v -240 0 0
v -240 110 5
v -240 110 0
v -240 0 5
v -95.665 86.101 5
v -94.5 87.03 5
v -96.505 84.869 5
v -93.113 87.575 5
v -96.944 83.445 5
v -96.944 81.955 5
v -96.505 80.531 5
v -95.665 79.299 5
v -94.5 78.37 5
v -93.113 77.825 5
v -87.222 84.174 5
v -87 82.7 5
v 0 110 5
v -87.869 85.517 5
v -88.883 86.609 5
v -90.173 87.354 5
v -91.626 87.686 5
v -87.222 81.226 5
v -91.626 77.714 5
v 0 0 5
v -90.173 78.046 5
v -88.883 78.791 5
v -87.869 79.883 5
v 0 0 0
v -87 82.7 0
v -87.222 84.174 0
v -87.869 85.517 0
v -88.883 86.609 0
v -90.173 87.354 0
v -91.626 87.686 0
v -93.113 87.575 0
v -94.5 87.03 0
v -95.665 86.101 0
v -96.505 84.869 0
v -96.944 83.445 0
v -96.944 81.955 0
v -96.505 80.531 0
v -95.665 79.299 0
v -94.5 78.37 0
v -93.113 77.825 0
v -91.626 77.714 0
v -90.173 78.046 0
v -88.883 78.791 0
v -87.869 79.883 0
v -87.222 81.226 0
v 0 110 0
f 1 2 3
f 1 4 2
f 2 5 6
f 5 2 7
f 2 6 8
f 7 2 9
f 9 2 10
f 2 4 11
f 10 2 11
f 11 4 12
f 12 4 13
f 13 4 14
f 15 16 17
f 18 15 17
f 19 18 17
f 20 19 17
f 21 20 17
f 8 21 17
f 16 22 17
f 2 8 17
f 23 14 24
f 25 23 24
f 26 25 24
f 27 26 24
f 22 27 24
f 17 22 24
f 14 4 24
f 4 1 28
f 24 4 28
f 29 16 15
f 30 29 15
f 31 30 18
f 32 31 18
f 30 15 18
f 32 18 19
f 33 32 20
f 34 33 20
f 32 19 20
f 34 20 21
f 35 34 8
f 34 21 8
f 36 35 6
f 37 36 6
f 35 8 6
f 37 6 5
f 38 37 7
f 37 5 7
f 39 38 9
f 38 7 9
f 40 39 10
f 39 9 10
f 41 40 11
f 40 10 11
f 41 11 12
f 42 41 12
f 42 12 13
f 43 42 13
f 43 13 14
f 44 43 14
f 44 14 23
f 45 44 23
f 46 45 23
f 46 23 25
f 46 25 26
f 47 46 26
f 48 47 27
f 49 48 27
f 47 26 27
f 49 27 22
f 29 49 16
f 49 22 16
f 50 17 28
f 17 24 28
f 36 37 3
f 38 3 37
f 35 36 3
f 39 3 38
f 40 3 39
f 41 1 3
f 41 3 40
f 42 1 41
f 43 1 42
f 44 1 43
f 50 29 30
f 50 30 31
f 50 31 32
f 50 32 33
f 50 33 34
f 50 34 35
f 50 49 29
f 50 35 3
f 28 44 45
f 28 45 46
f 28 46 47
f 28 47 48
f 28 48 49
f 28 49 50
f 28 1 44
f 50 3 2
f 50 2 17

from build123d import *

# Parameters (mm, degrees)
ESQUISSE1_W             = 240
ESQUISSE1_H             = 50
BOSS_EXTRU_1_DEPTH      = 5
ESQUISSE2_W             = 240
ESQUISSE2_H             = 5
BOSS_EXTRU_2_DEPTH      = 50
ESQUISSE4_R             = 5
ENL_V_MAT_EXTRU_1_DEPTH = 5
ESQUISSE5_W             = 240
ESQUISSE5_H             = 5
BOSS_EXTRU_3_DEPTH      = 10


with BuildPart() as part:
    # Esquisse1 → Boss.-Extru.1 (new body)
    with BuildSketch(Plane.XY):
        with Locations((-120, 25)):
            Rectangle(ESQUISSE1_W, ESQUISSE1_H)
    extrude(amount=BOSS_EXTRU_1_DEPTH)

    # Esquisse2 → Boss.-Extru.2 (add)
    with BuildSketch(Plane(origin=(0, 50, 0), x_dir=(1, 0, 0), z_dir=(0, 1, 0))):
        with Locations((-120, -2.5)):
            Rectangle(ESQUISSE2_W, ESQUISSE2_H)
    extrude(amount=BOSS_EXTRU_2_DEPTH)

    # Esquisse4 → Enlèv. mat.-Extru.1 (cut)
    with BuildSketch(Plane.XY.offset(5)):
        with Locations((-92, 82.7)):
            Circle(ESQUISSE4_R)
    extrude(amount=-ENL_V_MAT_EXTRU_1_DEPTH, mode=Mode.SUBTRACT)

    # Esquisse5 → Boss.-Extru.3 (add)
    with BuildSketch(Plane(origin=(0, 100, 0), x_dir=(1, 0, 0), z_dir=(0, 1, 0))):
        with Locations((-120, -2.5)):
            Rectangle(ESQUISSE5_W, ESQUISSE5_H)
    extrude(amount=BOSS_EXTRU_3_DEPTH)


solid = part.part
